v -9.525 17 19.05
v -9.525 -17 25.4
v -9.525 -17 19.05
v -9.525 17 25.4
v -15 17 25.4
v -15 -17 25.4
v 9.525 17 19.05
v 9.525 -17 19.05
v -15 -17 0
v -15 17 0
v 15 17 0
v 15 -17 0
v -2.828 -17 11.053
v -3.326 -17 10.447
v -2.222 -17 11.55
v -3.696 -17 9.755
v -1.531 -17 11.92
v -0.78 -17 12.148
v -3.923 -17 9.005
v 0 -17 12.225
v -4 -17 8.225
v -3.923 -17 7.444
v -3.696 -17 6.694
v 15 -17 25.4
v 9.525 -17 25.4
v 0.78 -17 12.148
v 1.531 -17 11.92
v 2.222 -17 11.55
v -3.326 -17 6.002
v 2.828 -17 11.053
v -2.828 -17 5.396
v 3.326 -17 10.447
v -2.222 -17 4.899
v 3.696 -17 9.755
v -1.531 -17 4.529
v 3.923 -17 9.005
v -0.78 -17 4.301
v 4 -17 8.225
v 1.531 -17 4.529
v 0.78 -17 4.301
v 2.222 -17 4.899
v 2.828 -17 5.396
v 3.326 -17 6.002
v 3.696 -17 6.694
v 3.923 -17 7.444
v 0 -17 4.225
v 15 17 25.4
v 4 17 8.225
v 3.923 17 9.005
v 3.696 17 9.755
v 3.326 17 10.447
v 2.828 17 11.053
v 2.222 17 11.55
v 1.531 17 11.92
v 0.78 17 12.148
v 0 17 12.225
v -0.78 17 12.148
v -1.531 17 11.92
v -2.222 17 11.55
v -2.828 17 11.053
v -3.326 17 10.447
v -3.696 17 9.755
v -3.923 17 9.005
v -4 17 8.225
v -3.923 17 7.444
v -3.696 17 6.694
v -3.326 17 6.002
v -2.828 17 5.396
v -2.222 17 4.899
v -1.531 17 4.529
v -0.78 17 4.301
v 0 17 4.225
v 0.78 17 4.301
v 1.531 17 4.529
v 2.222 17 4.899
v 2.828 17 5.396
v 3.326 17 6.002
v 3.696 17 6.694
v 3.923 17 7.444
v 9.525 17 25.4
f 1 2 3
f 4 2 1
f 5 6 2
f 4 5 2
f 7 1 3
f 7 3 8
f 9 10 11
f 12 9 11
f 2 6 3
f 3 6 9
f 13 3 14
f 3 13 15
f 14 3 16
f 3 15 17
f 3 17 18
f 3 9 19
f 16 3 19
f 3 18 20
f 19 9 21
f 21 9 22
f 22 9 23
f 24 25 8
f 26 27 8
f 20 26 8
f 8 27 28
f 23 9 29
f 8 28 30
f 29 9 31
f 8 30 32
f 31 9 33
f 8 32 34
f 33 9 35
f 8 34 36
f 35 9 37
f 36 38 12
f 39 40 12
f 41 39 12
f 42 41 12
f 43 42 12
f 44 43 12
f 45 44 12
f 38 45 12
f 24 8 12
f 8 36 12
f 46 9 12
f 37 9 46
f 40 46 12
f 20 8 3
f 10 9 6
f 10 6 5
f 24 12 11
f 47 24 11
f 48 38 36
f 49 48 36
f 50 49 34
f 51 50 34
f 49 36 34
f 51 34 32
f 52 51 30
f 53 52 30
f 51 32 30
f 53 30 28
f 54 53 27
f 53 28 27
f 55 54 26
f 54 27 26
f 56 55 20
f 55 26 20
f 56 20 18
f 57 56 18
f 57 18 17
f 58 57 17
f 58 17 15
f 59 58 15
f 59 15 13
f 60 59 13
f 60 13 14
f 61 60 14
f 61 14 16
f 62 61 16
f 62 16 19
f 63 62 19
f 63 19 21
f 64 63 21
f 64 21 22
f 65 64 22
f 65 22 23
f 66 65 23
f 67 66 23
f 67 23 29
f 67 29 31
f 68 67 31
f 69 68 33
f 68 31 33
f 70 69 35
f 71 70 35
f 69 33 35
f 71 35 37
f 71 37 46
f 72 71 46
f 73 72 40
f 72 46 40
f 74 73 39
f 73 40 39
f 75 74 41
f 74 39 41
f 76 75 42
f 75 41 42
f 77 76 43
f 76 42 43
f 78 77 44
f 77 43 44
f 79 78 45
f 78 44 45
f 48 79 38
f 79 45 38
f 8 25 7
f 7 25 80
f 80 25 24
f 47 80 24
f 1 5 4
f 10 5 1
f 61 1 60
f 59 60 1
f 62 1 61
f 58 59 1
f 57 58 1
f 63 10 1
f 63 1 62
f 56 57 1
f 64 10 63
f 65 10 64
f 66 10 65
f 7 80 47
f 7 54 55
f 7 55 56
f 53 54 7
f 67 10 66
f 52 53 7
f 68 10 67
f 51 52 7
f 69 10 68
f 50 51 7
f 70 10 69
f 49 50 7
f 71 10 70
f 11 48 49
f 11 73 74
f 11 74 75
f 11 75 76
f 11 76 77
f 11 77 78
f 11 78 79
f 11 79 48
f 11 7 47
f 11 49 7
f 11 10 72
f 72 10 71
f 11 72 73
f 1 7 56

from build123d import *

# Parameters (mm, degrees)
F0_W     = 30
F0_H     = 34
F1_DEPTH = 25.4
F2_R     = 4
F3_DEPTH = 34.001
F4_W     = 19.05
F4_H     = 34
F5_DEPTH = 6.35


with BuildPart() as f1:
    # F0 (on Top) → F1 (new body)
    with BuildSketch(Plane.XY):
        Rectangle(F0_W, F0_H)
    extrude(amount=F1_DEPTH)

    # F2 (on face) → F3 (cut, through all)
    with BuildSketch(Plane.XZ.offset(17)):
        with Locations((0, 8.224509)):
            Circle(F2_R)
    extrude(amount=-F3_DEPTH, mode=Mode.SUBTRACT)

    # F4 (on face) → F5 (cut)
    with BuildSketch(Plane.XY.offset(25.4)):
        Rectangle(F4_W, F4_H)
    extrude(amount=-F5_DEPTH, mode=Mode.SUBTRACT)


solid = f1.part
